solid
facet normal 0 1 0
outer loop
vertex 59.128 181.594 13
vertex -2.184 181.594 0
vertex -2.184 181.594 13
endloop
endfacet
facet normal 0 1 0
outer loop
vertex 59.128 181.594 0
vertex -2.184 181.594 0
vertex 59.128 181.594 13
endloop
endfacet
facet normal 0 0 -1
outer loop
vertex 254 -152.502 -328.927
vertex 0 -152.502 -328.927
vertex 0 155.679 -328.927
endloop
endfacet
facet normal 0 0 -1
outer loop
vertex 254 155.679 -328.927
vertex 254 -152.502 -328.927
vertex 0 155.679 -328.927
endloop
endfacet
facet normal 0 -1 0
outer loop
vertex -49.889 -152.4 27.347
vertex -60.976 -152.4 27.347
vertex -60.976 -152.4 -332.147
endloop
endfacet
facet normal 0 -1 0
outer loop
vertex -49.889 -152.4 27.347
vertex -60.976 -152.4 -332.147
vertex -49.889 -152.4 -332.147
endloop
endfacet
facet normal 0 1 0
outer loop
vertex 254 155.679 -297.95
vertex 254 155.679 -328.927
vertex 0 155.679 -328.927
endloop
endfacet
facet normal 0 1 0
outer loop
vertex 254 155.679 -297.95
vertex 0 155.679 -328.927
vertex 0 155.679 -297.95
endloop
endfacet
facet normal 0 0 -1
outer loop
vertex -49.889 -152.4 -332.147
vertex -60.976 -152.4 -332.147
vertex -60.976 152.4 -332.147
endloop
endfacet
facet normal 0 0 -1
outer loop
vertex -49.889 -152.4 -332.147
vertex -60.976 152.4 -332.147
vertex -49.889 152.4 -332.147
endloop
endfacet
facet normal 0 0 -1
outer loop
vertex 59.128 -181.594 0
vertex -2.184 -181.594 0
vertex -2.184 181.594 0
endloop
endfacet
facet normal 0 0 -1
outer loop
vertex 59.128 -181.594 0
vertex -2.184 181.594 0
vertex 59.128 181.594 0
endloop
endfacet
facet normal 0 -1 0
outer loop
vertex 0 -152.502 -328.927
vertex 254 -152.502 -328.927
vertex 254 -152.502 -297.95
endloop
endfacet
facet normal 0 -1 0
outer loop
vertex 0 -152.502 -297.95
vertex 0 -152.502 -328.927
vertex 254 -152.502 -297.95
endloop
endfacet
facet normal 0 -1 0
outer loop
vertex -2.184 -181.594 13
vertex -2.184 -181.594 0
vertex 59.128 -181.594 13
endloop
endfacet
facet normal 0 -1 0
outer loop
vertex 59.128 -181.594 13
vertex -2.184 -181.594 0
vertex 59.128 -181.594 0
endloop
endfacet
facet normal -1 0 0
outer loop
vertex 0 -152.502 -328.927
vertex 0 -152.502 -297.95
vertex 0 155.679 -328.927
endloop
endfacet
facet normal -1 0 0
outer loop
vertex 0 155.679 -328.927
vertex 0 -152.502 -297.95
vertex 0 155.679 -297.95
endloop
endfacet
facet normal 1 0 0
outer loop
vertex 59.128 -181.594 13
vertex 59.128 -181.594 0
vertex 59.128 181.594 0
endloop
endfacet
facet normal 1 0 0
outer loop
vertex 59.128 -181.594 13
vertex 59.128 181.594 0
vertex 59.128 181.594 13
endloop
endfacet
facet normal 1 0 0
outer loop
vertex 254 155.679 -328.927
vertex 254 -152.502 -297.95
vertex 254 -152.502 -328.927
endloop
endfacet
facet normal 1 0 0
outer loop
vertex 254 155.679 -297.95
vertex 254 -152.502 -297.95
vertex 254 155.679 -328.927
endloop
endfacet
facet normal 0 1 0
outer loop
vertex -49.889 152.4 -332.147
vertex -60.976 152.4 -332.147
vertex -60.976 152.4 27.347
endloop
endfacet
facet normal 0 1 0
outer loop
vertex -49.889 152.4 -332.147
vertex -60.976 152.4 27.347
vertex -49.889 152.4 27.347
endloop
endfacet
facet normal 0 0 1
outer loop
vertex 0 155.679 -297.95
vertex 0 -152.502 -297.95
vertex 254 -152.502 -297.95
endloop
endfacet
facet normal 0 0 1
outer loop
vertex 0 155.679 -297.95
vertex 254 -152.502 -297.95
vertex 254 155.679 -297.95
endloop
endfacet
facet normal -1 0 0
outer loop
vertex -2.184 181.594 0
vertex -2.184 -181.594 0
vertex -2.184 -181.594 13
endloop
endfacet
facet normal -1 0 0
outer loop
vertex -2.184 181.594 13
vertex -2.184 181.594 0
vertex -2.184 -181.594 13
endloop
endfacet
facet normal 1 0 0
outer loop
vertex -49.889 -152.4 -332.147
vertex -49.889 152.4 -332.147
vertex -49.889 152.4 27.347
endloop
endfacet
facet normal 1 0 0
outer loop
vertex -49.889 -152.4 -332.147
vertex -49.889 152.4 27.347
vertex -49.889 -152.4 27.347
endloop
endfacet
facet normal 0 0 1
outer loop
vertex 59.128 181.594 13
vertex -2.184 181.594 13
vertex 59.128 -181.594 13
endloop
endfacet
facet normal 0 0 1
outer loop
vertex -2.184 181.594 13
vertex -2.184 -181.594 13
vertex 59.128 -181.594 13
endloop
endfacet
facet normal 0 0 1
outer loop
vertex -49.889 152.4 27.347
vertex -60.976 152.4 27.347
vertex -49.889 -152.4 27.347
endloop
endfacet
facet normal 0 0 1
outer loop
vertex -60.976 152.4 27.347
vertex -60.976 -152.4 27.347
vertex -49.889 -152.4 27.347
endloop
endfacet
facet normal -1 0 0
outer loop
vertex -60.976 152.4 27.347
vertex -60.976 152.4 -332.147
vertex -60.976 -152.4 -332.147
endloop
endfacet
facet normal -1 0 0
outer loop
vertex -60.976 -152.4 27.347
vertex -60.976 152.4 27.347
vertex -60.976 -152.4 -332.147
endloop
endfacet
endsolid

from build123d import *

# Parameters (mm, degrees)
F0_W      = 61.3116323948
F0_H      = 58.3889186382
F1_DEPTH  = 13
F2_W      = 11.0865086317
F2_H      = 54.6934604645
F3_DEPTH  = 152.4
F4_DEPTH  = 152.4
F5_DEPTH  = 152.4
F6_DEPTH  = 152.4
F7_DEPTH  = 304.8
F9_W      = 308.1811517477
F9_H      = 30.9769511223
F10_DEPTH = 254


with BuildPart() as f1:
    # F0 (on Top) → F1 (new body)
    with BuildSketch(Plane.XY):
        with Locations((28.4722298384, 0)):
            Rectangle(F0_W, F0_H)
    extrude(amount=F1_DEPTH)

    # F5 (add): a face of the model
    f5_faces = [f1.faces().sort_by_distance(p)[0] for p in [
        (28.4722298384, -29.1944593191, 6.5),
    ]]
    extrude(f5_faces, amount=F5_DEPTH)

    # F6 (add): a face of the model
    f6_faces = [f1.faces().sort_by_distance(p)[0] for p in [
        (28.4722298384, 29.1944593191, 6.5),
    ]]
    extrude(f6_faces, amount=F6_DEPTH)


with BuildPart() as f3:
    # F2 (on Front) → F3 (new body)
    with BuildSketch(Plane.XZ):
        with Locations((-55.4325506091, 0)):
            Rectangle(F2_W, F2_H)
    extrude(amount=F3_DEPTH)

    # F4 (add): a face of the model
    f4_faces = [f3.faces().sort_by_distance(p)[0] for p in [
        (-55.4325506091, 0, 0),
    ]]
    extrude(f4_faces, amount=F4_DEPTH)

    # F7 (add): a face of the model
    f7_faces = [f3.faces().sort_by_distance(p)[0] for p in [
        (-55.4325506091, 0, -27.3467302322),
    ]]
    extrude(f7_faces, amount=F7_DEPTH)


with BuildPart() as f10:
    # F9 (on Right) → F10 (new body)
    with BuildSketch(Plane.YZ):
        with Locations((1.5885010362, -313.4380877018)):
            Rectangle(F9_W, F9_H)
    extrude(amount=F10_DEPTH)


solid = Compound([f1.part, f3.part, f10.part])
